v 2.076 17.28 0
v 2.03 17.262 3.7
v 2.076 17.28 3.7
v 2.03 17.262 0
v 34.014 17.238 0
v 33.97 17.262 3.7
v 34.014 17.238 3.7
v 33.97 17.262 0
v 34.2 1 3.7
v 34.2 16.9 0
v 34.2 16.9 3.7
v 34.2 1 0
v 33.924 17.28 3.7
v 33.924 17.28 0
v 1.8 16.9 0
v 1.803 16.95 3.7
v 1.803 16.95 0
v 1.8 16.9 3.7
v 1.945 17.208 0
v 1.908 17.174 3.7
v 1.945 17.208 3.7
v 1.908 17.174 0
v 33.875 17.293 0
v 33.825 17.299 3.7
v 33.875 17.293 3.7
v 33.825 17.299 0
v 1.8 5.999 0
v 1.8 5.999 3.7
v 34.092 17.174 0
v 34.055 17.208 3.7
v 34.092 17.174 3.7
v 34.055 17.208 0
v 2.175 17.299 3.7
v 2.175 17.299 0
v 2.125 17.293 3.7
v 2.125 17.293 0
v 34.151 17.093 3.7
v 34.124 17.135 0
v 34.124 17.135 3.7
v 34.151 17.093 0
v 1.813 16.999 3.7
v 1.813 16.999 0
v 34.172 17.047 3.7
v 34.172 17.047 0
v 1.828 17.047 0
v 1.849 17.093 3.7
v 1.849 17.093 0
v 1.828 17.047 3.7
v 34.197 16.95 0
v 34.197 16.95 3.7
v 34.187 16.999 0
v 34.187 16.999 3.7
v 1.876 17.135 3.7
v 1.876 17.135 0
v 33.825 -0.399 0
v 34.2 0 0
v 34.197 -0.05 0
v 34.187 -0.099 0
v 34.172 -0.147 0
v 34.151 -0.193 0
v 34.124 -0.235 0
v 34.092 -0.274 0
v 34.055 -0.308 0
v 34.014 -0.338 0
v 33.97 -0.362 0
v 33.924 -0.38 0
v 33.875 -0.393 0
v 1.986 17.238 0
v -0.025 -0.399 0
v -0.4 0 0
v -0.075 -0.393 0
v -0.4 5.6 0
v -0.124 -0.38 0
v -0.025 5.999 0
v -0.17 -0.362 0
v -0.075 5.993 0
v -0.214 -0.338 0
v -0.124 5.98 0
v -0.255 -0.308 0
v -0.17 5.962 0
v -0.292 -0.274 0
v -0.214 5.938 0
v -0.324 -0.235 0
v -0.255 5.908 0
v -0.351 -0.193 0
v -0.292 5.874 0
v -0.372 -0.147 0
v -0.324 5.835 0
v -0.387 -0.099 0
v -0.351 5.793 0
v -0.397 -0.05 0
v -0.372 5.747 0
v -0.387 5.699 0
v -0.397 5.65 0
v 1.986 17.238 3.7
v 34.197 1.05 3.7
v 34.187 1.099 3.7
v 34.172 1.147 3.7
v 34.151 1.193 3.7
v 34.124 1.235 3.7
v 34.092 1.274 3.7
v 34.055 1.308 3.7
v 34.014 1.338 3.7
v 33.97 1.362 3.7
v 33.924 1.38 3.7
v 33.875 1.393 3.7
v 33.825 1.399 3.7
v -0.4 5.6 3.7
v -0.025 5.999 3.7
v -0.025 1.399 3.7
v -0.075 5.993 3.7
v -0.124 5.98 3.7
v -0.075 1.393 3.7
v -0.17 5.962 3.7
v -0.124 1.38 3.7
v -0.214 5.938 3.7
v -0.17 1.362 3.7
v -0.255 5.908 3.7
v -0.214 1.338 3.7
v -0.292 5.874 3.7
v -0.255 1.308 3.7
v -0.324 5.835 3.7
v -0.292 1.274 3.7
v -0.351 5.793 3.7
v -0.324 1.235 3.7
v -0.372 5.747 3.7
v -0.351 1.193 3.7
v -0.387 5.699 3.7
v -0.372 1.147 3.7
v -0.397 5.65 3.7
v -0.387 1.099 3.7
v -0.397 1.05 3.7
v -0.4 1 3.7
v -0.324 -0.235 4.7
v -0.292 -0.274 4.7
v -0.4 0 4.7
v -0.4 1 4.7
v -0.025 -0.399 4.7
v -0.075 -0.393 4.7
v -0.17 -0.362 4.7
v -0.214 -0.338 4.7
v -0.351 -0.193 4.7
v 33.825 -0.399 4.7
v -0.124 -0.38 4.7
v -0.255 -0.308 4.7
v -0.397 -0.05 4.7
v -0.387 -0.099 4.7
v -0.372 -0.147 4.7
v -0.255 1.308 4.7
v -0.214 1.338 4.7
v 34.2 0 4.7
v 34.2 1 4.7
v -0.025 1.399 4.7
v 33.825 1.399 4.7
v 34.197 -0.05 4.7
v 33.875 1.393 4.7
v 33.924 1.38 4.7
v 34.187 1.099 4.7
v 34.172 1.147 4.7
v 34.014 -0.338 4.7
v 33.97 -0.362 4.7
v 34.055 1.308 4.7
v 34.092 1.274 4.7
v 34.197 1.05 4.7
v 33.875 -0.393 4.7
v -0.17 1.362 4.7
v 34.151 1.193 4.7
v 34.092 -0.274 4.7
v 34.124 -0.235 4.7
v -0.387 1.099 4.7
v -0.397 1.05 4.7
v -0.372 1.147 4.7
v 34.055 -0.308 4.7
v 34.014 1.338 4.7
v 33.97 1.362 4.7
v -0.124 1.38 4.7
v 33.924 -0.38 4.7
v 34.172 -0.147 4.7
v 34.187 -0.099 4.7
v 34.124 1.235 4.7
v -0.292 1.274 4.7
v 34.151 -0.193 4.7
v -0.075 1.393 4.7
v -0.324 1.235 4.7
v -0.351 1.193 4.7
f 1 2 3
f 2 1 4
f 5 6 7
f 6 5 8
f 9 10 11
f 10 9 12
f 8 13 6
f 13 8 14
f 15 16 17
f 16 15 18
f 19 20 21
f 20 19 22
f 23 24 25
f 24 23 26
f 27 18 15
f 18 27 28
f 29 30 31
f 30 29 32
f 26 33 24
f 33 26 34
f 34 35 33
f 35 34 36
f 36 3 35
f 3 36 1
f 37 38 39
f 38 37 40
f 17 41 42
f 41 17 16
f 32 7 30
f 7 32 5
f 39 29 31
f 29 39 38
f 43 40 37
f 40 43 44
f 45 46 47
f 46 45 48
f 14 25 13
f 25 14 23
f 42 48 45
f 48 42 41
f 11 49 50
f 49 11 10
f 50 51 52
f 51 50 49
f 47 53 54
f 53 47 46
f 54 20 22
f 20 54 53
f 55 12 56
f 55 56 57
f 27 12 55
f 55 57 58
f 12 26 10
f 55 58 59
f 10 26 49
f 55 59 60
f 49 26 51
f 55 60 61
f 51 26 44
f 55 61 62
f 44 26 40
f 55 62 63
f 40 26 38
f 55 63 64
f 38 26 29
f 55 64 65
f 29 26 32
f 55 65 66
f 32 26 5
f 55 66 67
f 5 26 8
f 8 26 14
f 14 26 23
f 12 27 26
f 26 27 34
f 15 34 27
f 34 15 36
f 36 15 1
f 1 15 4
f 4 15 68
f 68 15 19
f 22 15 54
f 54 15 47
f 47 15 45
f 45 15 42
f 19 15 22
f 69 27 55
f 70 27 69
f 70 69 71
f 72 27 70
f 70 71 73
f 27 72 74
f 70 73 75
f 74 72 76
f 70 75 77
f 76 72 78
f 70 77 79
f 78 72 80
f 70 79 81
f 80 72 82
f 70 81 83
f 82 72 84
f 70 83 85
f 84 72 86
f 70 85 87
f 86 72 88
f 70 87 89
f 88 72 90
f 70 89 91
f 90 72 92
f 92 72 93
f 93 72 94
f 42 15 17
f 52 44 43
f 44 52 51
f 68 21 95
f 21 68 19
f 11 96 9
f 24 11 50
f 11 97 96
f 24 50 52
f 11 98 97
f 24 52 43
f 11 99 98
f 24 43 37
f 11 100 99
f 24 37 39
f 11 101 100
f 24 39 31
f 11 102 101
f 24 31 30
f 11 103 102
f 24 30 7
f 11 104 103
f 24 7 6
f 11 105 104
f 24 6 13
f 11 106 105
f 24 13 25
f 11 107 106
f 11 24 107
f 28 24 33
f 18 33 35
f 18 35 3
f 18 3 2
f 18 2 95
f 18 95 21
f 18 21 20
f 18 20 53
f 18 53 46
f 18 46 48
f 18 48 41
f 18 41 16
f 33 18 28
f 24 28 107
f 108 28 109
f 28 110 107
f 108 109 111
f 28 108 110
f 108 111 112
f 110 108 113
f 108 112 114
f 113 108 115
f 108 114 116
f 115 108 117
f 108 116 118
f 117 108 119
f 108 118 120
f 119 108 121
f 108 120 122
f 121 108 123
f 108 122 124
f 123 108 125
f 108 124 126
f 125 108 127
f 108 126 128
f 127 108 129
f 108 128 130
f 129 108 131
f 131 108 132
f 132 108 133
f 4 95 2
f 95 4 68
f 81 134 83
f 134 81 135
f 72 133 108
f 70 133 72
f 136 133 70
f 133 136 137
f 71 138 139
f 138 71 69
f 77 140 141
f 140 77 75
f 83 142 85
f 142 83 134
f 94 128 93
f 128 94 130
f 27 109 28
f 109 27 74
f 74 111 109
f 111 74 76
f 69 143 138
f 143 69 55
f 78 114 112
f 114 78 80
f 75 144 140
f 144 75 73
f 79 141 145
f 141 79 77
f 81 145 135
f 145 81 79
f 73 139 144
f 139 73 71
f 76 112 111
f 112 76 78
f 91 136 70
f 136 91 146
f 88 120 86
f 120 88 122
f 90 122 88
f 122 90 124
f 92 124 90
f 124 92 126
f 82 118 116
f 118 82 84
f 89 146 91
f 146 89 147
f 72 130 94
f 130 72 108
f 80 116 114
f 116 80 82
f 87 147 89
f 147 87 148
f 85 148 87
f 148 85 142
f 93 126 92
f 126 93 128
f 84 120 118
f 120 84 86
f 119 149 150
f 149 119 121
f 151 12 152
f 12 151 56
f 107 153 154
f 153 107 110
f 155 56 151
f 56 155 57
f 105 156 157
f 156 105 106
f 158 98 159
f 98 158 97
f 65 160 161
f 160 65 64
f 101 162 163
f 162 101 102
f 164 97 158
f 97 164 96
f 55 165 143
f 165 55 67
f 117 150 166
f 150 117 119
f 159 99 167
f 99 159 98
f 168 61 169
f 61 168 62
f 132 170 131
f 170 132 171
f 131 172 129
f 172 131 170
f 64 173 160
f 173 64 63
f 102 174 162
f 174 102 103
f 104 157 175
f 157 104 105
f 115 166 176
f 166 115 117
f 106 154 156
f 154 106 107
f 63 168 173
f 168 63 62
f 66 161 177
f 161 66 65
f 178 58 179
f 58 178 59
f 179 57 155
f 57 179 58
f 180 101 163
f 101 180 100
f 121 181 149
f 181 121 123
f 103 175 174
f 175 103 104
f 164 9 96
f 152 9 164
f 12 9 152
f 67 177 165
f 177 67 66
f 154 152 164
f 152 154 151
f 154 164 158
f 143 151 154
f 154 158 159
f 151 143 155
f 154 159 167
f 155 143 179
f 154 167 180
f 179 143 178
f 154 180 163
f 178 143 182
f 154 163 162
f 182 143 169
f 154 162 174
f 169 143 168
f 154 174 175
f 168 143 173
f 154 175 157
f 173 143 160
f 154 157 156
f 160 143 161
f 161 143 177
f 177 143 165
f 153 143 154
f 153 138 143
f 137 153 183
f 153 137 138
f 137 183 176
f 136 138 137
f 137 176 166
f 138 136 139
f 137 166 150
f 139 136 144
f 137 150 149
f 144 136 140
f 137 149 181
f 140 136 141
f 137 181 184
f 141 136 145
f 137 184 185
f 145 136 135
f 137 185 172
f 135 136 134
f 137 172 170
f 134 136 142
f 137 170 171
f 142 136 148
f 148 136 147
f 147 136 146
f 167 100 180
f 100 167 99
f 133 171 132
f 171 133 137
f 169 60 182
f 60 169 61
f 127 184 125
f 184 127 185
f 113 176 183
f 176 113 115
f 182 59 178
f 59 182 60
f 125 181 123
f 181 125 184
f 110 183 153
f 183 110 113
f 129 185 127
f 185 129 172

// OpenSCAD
$fn		= 50;

tolerance	= 0.4;

width		= 35 - tolerance;
length		= 35 - tolerance;
thickness	= 4.1 - tolerance;
corner_radius	= 0.4;

lip_height	= thickness + 1;

notch_width	= 3;
notch_length	= 6.4;

points = [[0						, 0],
	  [width - 2 * corner_radius			, 0],
	  [width - 2 * corner_radius			, (length - 2 * corner_radius) / 2],
	  [notch_width - 2 * corner_radius		, (length - 2 * corner_radius) / 2],
	  [notch_width - 2 * corner_radius		, notch_length - 2 * corner_radius],
	  [0						, notch_length - 2 * corner_radius],
	  [0						, 0]];

module cartridge_cover(points) {
  union() {
    minkowski() {
      linear_extrude(thickness / 2)
	polygon(points = points);

      cylinder(h = thickness / 2, r = corner_radius);
    }


    hull() {
      lip = [[0				, 0],
	     [width - 2 * corner_radius	, 0],
	     [0				, 1],
	     [width - 2 * corner_radius	, 1]];

      for (p = lip) {
	translate(p) cylinder(h = lip_height, r = corner_radius);
      }
    }
  }
}

cartridge_cover(points);
